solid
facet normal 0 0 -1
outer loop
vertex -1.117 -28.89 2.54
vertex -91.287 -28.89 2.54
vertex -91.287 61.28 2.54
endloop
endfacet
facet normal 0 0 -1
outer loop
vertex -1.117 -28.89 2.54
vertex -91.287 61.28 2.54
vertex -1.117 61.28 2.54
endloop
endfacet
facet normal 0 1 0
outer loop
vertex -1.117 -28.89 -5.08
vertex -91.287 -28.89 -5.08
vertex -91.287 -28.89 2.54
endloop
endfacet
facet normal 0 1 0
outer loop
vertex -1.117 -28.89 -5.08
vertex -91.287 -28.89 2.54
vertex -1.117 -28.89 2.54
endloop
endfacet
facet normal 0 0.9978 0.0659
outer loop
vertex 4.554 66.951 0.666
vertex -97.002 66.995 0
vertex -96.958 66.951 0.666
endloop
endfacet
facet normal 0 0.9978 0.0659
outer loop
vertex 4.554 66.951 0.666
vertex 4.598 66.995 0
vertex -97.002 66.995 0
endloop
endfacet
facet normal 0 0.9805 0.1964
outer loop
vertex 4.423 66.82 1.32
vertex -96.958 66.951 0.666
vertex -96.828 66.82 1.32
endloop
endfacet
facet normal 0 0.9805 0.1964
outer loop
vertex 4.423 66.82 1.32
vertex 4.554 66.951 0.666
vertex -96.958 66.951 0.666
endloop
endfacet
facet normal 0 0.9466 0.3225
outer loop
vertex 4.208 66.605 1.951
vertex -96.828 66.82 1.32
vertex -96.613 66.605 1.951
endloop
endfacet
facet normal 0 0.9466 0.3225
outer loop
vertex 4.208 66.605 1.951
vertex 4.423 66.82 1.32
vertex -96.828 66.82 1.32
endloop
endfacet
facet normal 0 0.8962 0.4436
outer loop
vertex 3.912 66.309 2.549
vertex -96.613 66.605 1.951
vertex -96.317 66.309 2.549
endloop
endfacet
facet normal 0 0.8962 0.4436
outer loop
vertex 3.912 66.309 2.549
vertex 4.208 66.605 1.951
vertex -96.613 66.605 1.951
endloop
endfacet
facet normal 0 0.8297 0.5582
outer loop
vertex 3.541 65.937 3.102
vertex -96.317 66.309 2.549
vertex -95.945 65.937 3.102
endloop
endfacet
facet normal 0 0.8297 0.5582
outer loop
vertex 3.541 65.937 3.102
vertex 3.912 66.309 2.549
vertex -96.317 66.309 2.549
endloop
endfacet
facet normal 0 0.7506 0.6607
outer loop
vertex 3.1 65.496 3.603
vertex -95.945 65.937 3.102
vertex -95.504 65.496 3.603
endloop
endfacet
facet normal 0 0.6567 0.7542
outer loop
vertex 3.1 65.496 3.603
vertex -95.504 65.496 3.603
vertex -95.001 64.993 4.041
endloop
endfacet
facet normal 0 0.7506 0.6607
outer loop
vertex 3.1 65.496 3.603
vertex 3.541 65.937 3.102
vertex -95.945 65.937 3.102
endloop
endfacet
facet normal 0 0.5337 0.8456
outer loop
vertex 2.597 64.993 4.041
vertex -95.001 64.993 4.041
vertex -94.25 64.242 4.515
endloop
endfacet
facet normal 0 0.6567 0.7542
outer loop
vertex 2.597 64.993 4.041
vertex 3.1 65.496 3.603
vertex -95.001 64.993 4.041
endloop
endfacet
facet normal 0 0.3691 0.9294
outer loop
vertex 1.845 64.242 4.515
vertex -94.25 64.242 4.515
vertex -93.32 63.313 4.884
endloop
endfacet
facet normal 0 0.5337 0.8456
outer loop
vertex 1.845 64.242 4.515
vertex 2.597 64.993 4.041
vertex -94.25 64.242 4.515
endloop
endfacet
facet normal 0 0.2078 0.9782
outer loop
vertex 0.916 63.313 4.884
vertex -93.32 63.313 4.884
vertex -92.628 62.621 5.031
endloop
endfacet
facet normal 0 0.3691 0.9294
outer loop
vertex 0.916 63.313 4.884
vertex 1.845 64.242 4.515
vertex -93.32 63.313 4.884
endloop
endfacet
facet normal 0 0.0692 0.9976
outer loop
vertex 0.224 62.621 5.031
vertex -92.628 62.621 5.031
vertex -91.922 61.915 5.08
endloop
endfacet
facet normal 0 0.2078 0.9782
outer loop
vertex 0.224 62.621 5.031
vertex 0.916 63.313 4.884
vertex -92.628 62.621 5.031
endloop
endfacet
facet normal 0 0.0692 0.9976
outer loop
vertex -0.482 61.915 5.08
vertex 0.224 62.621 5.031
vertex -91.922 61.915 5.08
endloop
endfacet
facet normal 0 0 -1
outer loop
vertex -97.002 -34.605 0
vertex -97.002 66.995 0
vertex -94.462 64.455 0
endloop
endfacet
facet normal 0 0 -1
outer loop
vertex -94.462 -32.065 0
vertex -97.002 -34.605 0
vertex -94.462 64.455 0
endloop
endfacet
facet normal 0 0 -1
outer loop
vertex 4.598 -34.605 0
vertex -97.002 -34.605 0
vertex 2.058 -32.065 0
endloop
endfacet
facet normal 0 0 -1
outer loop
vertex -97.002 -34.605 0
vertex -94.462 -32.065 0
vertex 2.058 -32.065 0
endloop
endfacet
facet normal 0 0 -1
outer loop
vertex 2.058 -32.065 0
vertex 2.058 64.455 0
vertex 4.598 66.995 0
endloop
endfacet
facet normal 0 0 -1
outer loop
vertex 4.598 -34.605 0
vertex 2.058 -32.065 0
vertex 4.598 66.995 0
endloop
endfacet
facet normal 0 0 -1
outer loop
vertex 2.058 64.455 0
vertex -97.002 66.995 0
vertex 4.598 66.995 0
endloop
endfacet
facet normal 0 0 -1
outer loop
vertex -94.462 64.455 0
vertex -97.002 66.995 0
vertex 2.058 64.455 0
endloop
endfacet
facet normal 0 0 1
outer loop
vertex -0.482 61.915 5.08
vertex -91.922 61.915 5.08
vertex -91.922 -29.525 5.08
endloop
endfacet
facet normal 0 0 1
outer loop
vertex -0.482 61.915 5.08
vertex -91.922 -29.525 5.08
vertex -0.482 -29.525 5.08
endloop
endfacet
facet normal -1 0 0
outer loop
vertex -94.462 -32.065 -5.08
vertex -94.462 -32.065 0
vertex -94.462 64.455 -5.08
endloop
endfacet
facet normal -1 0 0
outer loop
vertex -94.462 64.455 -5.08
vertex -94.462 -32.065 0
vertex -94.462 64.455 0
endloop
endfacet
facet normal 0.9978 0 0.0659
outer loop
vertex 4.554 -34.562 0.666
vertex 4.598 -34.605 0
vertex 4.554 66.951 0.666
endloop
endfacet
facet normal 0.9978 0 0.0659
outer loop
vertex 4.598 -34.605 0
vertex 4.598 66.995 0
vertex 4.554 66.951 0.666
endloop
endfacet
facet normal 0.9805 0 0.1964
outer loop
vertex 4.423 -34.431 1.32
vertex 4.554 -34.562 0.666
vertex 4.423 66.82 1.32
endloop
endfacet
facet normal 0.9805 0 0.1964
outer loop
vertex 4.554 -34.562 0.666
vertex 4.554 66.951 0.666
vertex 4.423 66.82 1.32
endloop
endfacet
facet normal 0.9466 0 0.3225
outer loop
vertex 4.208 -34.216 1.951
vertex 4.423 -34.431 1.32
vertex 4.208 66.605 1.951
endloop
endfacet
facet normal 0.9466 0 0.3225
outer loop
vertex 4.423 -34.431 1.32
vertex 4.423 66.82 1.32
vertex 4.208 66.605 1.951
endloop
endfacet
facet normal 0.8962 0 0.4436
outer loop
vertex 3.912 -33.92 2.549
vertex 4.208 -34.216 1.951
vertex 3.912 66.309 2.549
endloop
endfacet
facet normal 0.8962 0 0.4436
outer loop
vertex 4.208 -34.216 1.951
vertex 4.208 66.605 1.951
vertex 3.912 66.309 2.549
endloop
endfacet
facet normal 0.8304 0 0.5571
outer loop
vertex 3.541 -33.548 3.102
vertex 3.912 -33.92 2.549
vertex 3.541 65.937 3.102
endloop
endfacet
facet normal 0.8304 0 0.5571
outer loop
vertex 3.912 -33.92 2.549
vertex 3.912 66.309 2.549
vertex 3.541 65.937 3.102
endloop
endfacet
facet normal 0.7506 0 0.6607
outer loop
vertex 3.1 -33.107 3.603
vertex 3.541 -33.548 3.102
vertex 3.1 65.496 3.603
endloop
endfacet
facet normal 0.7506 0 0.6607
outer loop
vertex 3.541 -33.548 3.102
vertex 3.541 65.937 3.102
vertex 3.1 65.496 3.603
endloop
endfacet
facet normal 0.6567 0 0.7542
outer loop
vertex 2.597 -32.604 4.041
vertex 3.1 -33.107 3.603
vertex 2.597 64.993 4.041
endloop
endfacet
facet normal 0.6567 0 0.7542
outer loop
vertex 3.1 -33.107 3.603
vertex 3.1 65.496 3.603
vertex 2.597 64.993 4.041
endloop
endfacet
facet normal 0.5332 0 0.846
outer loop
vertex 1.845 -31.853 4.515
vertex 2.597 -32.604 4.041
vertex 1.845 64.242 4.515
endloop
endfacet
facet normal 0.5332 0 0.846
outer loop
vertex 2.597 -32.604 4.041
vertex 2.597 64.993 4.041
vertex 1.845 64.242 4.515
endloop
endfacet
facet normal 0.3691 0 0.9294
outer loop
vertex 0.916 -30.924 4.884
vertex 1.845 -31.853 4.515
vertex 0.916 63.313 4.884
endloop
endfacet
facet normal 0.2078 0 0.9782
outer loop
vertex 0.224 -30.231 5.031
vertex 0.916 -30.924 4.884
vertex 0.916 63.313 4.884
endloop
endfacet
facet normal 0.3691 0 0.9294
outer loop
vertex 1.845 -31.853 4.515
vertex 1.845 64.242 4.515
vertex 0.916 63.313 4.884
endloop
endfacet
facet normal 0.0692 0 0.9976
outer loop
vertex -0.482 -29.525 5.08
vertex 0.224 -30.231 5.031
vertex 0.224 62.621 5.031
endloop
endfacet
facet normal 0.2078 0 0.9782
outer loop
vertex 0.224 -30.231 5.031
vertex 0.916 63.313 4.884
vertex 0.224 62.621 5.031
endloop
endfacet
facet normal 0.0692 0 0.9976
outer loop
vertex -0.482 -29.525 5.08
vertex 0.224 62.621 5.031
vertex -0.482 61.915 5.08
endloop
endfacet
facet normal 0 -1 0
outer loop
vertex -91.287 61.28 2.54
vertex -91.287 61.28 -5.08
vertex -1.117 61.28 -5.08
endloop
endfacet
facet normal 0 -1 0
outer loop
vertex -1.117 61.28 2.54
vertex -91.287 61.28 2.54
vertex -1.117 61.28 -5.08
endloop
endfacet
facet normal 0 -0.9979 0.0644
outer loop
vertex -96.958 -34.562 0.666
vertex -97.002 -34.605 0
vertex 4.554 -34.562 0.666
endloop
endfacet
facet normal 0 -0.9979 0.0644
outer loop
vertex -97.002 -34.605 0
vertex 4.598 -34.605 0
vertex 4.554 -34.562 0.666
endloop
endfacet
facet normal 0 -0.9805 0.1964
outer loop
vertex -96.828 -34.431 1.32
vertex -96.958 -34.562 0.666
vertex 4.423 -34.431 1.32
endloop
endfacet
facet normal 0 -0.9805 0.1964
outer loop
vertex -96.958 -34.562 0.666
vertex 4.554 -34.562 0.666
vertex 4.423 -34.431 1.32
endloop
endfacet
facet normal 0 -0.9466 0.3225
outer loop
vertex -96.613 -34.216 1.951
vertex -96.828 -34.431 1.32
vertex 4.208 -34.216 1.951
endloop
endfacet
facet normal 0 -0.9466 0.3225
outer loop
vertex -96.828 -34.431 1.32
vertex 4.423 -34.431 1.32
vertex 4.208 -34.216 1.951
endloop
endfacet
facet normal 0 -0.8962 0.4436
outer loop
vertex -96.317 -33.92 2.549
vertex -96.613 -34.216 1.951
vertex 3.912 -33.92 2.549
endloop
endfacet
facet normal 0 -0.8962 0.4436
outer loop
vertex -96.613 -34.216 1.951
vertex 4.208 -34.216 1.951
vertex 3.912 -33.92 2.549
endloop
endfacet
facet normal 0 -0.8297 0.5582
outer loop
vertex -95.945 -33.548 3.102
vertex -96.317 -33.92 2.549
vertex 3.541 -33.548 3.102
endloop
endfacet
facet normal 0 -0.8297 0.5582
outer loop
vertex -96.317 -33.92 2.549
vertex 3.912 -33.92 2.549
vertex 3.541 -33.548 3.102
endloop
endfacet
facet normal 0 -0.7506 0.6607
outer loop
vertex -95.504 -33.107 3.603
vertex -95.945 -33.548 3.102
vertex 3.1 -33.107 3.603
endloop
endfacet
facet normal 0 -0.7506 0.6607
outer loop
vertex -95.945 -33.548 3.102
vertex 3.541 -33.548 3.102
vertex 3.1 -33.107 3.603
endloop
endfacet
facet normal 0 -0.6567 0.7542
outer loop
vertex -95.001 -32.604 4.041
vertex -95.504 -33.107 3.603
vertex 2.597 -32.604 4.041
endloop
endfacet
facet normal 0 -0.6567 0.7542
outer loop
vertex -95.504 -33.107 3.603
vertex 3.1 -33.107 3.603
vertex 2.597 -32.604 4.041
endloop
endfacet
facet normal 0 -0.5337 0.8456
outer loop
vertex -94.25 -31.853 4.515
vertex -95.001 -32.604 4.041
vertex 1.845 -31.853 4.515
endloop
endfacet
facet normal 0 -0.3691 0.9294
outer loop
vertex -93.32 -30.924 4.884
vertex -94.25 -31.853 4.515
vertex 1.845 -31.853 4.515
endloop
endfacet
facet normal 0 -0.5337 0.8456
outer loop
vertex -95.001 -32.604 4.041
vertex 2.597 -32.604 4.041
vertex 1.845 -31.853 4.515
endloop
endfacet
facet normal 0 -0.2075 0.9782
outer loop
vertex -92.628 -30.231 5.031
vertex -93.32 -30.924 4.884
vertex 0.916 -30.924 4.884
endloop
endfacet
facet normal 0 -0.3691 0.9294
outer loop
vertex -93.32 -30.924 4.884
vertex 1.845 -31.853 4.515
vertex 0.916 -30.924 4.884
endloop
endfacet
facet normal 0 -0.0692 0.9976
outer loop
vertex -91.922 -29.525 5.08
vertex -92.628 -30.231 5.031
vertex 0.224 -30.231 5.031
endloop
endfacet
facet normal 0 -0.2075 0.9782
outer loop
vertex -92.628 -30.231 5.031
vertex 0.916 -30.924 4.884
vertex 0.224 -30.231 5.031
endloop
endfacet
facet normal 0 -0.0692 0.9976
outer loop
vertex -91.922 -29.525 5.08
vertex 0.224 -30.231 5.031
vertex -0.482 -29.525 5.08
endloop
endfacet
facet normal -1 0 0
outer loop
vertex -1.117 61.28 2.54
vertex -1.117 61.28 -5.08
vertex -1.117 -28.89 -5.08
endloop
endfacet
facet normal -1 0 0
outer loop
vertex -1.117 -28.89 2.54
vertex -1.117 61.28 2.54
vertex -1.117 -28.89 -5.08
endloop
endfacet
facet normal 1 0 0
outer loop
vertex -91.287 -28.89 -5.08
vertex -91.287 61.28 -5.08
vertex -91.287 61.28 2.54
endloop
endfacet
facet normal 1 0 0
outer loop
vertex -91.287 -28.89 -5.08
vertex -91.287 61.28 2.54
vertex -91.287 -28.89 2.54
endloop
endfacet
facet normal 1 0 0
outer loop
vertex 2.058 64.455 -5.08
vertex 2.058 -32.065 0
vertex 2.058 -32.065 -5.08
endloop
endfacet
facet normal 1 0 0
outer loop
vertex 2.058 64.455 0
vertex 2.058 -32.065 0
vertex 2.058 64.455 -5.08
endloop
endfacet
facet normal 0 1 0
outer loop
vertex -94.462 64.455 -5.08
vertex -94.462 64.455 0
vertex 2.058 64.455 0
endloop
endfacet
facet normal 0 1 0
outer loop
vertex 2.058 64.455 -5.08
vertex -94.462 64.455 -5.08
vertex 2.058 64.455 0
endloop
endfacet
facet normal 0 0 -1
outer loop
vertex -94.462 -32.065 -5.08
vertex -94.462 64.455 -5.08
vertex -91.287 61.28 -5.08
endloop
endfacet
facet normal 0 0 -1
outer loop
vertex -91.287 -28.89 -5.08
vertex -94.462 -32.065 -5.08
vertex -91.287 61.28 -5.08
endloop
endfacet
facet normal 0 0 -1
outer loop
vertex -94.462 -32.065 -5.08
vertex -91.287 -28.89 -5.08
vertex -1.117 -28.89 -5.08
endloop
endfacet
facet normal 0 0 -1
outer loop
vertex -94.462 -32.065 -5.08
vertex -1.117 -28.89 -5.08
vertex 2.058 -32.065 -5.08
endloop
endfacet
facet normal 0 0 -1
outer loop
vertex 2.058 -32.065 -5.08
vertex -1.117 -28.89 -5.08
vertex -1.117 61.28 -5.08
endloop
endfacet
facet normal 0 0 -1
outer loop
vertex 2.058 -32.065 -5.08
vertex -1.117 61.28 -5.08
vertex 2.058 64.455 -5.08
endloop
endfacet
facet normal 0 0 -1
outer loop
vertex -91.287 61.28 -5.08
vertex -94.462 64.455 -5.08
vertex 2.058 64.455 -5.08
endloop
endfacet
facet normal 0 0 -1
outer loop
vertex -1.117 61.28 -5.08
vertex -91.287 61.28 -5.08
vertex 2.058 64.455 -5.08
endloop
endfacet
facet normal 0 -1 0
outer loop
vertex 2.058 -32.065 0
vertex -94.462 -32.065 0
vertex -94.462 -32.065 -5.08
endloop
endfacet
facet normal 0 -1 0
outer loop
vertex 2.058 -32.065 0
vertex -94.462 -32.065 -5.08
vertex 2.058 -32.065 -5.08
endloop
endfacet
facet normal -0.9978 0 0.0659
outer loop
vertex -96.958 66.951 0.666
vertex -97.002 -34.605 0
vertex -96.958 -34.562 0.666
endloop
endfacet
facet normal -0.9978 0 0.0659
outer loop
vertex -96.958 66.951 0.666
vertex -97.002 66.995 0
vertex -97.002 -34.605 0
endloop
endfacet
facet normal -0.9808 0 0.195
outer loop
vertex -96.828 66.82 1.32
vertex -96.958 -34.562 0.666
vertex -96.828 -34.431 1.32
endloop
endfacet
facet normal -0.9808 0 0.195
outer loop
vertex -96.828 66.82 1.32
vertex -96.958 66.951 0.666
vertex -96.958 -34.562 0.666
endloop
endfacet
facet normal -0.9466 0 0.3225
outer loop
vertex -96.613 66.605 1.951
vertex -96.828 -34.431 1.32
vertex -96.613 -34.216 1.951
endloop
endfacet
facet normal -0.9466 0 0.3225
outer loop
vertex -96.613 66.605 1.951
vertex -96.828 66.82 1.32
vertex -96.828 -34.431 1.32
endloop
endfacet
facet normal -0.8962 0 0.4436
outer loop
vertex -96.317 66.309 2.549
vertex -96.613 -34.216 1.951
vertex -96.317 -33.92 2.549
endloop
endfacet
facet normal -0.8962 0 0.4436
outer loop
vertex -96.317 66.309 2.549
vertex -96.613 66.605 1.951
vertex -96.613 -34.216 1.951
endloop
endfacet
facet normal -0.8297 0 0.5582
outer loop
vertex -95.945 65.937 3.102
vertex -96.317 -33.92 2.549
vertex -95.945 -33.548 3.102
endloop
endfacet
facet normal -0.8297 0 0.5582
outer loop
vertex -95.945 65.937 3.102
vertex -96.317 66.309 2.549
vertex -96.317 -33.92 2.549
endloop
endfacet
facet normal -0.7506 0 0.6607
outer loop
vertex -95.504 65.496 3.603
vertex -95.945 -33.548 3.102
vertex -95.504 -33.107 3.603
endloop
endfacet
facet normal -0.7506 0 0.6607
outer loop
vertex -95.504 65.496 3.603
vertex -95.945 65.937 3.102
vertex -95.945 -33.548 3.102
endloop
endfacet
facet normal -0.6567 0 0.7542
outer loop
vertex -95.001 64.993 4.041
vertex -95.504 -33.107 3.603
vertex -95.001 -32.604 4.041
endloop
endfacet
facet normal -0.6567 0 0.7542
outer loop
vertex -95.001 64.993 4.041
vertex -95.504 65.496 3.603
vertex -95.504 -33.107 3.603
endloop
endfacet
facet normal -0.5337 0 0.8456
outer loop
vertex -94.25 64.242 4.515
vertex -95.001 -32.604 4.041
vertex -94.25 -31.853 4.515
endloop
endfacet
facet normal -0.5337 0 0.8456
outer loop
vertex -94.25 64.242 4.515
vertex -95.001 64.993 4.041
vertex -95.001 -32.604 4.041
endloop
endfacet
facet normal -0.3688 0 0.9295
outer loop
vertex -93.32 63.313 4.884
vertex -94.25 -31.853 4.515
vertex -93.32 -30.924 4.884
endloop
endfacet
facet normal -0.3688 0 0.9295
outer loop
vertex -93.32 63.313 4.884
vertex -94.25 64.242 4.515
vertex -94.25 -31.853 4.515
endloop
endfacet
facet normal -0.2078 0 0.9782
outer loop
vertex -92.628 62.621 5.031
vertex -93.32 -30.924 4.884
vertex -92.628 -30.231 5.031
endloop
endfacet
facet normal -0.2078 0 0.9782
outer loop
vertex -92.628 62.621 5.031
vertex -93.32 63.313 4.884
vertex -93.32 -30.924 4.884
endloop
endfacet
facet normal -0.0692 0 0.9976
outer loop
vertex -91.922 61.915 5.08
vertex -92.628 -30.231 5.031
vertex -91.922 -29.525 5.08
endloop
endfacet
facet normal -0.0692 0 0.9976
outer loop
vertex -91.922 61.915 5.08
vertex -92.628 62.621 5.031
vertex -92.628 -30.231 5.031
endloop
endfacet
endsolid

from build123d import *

# Parameters (mm, degrees)
F0_W     = 101.6
F0_H     = 101.6
F0_W_2   = 96.52
F0_H_2   = 96.52
F1_DEPTH = 5.08
F2_R     = 5.07999
F3_DEPTH = 5.08
F4_W     = 90.17
F4_H     = 90.17
F5_DEPTH = 7.62


# Not quite as in the source:
# - a fillet or chamfer is up to 0.001 mm smaller than in the source, because OpenCascade refuses the exact size


with BuildPart() as f1:
    # F0 (on Top) → F1 (new body)
    with BuildSketch(Plane.XY):
        with Locations((-46.2021417916, 16.1945652217)):
            Rectangle(F0_W, F0_H)
        with Locations((-46.2021417916, 16.1945652217)):
            Rectangle(F0_W_2, F0_H_2, mode=Mode.SUBTRACT)
        with Locations((-46.2021417916, 16.1945652217)):
            Rectangle(F0_W_2, F0_H_2)
    extrude(amount=F1_DEPTH)

    # F2 (radius 5.08 in the source; OpenCascade refuses exactly that, so slightly less here)
    f2_edges = [f1.edges().sort_by_distance(p)[0] for p in [
        (-97.002142, 16.194565, 5.08),
        (-46.202142, -34.605435, 5.08),
        (4.597858, 16.194565, 5.08),
        (-46.202142, 66.994565, 5.08),
    ]]
    fillet(f2_edges, radius=F2_R)

    # F0 (on Top) → F3 (join)
    with BuildSketch(Plane.XY):
        with Locations((-46.2021417916, 16.1945652217)):
            Rectangle(F0_W_2, F0_H_2)
    extrude(amount=-F3_DEPTH)

    # F4 (on face) → F5 (cut)
    with BuildSketch(Plane(origin=(0, 0, -5.08), x_dir=(1, 0, 0), z_dir=(0, 0, -1))):
        with Locations((-46.2021417916, -16.1945652217)):
            Rectangle(F4_W, F4_H)
    extrude(amount=-F5_DEPTH, mode=Mode.SUBTRACT)


solid = f1.part
